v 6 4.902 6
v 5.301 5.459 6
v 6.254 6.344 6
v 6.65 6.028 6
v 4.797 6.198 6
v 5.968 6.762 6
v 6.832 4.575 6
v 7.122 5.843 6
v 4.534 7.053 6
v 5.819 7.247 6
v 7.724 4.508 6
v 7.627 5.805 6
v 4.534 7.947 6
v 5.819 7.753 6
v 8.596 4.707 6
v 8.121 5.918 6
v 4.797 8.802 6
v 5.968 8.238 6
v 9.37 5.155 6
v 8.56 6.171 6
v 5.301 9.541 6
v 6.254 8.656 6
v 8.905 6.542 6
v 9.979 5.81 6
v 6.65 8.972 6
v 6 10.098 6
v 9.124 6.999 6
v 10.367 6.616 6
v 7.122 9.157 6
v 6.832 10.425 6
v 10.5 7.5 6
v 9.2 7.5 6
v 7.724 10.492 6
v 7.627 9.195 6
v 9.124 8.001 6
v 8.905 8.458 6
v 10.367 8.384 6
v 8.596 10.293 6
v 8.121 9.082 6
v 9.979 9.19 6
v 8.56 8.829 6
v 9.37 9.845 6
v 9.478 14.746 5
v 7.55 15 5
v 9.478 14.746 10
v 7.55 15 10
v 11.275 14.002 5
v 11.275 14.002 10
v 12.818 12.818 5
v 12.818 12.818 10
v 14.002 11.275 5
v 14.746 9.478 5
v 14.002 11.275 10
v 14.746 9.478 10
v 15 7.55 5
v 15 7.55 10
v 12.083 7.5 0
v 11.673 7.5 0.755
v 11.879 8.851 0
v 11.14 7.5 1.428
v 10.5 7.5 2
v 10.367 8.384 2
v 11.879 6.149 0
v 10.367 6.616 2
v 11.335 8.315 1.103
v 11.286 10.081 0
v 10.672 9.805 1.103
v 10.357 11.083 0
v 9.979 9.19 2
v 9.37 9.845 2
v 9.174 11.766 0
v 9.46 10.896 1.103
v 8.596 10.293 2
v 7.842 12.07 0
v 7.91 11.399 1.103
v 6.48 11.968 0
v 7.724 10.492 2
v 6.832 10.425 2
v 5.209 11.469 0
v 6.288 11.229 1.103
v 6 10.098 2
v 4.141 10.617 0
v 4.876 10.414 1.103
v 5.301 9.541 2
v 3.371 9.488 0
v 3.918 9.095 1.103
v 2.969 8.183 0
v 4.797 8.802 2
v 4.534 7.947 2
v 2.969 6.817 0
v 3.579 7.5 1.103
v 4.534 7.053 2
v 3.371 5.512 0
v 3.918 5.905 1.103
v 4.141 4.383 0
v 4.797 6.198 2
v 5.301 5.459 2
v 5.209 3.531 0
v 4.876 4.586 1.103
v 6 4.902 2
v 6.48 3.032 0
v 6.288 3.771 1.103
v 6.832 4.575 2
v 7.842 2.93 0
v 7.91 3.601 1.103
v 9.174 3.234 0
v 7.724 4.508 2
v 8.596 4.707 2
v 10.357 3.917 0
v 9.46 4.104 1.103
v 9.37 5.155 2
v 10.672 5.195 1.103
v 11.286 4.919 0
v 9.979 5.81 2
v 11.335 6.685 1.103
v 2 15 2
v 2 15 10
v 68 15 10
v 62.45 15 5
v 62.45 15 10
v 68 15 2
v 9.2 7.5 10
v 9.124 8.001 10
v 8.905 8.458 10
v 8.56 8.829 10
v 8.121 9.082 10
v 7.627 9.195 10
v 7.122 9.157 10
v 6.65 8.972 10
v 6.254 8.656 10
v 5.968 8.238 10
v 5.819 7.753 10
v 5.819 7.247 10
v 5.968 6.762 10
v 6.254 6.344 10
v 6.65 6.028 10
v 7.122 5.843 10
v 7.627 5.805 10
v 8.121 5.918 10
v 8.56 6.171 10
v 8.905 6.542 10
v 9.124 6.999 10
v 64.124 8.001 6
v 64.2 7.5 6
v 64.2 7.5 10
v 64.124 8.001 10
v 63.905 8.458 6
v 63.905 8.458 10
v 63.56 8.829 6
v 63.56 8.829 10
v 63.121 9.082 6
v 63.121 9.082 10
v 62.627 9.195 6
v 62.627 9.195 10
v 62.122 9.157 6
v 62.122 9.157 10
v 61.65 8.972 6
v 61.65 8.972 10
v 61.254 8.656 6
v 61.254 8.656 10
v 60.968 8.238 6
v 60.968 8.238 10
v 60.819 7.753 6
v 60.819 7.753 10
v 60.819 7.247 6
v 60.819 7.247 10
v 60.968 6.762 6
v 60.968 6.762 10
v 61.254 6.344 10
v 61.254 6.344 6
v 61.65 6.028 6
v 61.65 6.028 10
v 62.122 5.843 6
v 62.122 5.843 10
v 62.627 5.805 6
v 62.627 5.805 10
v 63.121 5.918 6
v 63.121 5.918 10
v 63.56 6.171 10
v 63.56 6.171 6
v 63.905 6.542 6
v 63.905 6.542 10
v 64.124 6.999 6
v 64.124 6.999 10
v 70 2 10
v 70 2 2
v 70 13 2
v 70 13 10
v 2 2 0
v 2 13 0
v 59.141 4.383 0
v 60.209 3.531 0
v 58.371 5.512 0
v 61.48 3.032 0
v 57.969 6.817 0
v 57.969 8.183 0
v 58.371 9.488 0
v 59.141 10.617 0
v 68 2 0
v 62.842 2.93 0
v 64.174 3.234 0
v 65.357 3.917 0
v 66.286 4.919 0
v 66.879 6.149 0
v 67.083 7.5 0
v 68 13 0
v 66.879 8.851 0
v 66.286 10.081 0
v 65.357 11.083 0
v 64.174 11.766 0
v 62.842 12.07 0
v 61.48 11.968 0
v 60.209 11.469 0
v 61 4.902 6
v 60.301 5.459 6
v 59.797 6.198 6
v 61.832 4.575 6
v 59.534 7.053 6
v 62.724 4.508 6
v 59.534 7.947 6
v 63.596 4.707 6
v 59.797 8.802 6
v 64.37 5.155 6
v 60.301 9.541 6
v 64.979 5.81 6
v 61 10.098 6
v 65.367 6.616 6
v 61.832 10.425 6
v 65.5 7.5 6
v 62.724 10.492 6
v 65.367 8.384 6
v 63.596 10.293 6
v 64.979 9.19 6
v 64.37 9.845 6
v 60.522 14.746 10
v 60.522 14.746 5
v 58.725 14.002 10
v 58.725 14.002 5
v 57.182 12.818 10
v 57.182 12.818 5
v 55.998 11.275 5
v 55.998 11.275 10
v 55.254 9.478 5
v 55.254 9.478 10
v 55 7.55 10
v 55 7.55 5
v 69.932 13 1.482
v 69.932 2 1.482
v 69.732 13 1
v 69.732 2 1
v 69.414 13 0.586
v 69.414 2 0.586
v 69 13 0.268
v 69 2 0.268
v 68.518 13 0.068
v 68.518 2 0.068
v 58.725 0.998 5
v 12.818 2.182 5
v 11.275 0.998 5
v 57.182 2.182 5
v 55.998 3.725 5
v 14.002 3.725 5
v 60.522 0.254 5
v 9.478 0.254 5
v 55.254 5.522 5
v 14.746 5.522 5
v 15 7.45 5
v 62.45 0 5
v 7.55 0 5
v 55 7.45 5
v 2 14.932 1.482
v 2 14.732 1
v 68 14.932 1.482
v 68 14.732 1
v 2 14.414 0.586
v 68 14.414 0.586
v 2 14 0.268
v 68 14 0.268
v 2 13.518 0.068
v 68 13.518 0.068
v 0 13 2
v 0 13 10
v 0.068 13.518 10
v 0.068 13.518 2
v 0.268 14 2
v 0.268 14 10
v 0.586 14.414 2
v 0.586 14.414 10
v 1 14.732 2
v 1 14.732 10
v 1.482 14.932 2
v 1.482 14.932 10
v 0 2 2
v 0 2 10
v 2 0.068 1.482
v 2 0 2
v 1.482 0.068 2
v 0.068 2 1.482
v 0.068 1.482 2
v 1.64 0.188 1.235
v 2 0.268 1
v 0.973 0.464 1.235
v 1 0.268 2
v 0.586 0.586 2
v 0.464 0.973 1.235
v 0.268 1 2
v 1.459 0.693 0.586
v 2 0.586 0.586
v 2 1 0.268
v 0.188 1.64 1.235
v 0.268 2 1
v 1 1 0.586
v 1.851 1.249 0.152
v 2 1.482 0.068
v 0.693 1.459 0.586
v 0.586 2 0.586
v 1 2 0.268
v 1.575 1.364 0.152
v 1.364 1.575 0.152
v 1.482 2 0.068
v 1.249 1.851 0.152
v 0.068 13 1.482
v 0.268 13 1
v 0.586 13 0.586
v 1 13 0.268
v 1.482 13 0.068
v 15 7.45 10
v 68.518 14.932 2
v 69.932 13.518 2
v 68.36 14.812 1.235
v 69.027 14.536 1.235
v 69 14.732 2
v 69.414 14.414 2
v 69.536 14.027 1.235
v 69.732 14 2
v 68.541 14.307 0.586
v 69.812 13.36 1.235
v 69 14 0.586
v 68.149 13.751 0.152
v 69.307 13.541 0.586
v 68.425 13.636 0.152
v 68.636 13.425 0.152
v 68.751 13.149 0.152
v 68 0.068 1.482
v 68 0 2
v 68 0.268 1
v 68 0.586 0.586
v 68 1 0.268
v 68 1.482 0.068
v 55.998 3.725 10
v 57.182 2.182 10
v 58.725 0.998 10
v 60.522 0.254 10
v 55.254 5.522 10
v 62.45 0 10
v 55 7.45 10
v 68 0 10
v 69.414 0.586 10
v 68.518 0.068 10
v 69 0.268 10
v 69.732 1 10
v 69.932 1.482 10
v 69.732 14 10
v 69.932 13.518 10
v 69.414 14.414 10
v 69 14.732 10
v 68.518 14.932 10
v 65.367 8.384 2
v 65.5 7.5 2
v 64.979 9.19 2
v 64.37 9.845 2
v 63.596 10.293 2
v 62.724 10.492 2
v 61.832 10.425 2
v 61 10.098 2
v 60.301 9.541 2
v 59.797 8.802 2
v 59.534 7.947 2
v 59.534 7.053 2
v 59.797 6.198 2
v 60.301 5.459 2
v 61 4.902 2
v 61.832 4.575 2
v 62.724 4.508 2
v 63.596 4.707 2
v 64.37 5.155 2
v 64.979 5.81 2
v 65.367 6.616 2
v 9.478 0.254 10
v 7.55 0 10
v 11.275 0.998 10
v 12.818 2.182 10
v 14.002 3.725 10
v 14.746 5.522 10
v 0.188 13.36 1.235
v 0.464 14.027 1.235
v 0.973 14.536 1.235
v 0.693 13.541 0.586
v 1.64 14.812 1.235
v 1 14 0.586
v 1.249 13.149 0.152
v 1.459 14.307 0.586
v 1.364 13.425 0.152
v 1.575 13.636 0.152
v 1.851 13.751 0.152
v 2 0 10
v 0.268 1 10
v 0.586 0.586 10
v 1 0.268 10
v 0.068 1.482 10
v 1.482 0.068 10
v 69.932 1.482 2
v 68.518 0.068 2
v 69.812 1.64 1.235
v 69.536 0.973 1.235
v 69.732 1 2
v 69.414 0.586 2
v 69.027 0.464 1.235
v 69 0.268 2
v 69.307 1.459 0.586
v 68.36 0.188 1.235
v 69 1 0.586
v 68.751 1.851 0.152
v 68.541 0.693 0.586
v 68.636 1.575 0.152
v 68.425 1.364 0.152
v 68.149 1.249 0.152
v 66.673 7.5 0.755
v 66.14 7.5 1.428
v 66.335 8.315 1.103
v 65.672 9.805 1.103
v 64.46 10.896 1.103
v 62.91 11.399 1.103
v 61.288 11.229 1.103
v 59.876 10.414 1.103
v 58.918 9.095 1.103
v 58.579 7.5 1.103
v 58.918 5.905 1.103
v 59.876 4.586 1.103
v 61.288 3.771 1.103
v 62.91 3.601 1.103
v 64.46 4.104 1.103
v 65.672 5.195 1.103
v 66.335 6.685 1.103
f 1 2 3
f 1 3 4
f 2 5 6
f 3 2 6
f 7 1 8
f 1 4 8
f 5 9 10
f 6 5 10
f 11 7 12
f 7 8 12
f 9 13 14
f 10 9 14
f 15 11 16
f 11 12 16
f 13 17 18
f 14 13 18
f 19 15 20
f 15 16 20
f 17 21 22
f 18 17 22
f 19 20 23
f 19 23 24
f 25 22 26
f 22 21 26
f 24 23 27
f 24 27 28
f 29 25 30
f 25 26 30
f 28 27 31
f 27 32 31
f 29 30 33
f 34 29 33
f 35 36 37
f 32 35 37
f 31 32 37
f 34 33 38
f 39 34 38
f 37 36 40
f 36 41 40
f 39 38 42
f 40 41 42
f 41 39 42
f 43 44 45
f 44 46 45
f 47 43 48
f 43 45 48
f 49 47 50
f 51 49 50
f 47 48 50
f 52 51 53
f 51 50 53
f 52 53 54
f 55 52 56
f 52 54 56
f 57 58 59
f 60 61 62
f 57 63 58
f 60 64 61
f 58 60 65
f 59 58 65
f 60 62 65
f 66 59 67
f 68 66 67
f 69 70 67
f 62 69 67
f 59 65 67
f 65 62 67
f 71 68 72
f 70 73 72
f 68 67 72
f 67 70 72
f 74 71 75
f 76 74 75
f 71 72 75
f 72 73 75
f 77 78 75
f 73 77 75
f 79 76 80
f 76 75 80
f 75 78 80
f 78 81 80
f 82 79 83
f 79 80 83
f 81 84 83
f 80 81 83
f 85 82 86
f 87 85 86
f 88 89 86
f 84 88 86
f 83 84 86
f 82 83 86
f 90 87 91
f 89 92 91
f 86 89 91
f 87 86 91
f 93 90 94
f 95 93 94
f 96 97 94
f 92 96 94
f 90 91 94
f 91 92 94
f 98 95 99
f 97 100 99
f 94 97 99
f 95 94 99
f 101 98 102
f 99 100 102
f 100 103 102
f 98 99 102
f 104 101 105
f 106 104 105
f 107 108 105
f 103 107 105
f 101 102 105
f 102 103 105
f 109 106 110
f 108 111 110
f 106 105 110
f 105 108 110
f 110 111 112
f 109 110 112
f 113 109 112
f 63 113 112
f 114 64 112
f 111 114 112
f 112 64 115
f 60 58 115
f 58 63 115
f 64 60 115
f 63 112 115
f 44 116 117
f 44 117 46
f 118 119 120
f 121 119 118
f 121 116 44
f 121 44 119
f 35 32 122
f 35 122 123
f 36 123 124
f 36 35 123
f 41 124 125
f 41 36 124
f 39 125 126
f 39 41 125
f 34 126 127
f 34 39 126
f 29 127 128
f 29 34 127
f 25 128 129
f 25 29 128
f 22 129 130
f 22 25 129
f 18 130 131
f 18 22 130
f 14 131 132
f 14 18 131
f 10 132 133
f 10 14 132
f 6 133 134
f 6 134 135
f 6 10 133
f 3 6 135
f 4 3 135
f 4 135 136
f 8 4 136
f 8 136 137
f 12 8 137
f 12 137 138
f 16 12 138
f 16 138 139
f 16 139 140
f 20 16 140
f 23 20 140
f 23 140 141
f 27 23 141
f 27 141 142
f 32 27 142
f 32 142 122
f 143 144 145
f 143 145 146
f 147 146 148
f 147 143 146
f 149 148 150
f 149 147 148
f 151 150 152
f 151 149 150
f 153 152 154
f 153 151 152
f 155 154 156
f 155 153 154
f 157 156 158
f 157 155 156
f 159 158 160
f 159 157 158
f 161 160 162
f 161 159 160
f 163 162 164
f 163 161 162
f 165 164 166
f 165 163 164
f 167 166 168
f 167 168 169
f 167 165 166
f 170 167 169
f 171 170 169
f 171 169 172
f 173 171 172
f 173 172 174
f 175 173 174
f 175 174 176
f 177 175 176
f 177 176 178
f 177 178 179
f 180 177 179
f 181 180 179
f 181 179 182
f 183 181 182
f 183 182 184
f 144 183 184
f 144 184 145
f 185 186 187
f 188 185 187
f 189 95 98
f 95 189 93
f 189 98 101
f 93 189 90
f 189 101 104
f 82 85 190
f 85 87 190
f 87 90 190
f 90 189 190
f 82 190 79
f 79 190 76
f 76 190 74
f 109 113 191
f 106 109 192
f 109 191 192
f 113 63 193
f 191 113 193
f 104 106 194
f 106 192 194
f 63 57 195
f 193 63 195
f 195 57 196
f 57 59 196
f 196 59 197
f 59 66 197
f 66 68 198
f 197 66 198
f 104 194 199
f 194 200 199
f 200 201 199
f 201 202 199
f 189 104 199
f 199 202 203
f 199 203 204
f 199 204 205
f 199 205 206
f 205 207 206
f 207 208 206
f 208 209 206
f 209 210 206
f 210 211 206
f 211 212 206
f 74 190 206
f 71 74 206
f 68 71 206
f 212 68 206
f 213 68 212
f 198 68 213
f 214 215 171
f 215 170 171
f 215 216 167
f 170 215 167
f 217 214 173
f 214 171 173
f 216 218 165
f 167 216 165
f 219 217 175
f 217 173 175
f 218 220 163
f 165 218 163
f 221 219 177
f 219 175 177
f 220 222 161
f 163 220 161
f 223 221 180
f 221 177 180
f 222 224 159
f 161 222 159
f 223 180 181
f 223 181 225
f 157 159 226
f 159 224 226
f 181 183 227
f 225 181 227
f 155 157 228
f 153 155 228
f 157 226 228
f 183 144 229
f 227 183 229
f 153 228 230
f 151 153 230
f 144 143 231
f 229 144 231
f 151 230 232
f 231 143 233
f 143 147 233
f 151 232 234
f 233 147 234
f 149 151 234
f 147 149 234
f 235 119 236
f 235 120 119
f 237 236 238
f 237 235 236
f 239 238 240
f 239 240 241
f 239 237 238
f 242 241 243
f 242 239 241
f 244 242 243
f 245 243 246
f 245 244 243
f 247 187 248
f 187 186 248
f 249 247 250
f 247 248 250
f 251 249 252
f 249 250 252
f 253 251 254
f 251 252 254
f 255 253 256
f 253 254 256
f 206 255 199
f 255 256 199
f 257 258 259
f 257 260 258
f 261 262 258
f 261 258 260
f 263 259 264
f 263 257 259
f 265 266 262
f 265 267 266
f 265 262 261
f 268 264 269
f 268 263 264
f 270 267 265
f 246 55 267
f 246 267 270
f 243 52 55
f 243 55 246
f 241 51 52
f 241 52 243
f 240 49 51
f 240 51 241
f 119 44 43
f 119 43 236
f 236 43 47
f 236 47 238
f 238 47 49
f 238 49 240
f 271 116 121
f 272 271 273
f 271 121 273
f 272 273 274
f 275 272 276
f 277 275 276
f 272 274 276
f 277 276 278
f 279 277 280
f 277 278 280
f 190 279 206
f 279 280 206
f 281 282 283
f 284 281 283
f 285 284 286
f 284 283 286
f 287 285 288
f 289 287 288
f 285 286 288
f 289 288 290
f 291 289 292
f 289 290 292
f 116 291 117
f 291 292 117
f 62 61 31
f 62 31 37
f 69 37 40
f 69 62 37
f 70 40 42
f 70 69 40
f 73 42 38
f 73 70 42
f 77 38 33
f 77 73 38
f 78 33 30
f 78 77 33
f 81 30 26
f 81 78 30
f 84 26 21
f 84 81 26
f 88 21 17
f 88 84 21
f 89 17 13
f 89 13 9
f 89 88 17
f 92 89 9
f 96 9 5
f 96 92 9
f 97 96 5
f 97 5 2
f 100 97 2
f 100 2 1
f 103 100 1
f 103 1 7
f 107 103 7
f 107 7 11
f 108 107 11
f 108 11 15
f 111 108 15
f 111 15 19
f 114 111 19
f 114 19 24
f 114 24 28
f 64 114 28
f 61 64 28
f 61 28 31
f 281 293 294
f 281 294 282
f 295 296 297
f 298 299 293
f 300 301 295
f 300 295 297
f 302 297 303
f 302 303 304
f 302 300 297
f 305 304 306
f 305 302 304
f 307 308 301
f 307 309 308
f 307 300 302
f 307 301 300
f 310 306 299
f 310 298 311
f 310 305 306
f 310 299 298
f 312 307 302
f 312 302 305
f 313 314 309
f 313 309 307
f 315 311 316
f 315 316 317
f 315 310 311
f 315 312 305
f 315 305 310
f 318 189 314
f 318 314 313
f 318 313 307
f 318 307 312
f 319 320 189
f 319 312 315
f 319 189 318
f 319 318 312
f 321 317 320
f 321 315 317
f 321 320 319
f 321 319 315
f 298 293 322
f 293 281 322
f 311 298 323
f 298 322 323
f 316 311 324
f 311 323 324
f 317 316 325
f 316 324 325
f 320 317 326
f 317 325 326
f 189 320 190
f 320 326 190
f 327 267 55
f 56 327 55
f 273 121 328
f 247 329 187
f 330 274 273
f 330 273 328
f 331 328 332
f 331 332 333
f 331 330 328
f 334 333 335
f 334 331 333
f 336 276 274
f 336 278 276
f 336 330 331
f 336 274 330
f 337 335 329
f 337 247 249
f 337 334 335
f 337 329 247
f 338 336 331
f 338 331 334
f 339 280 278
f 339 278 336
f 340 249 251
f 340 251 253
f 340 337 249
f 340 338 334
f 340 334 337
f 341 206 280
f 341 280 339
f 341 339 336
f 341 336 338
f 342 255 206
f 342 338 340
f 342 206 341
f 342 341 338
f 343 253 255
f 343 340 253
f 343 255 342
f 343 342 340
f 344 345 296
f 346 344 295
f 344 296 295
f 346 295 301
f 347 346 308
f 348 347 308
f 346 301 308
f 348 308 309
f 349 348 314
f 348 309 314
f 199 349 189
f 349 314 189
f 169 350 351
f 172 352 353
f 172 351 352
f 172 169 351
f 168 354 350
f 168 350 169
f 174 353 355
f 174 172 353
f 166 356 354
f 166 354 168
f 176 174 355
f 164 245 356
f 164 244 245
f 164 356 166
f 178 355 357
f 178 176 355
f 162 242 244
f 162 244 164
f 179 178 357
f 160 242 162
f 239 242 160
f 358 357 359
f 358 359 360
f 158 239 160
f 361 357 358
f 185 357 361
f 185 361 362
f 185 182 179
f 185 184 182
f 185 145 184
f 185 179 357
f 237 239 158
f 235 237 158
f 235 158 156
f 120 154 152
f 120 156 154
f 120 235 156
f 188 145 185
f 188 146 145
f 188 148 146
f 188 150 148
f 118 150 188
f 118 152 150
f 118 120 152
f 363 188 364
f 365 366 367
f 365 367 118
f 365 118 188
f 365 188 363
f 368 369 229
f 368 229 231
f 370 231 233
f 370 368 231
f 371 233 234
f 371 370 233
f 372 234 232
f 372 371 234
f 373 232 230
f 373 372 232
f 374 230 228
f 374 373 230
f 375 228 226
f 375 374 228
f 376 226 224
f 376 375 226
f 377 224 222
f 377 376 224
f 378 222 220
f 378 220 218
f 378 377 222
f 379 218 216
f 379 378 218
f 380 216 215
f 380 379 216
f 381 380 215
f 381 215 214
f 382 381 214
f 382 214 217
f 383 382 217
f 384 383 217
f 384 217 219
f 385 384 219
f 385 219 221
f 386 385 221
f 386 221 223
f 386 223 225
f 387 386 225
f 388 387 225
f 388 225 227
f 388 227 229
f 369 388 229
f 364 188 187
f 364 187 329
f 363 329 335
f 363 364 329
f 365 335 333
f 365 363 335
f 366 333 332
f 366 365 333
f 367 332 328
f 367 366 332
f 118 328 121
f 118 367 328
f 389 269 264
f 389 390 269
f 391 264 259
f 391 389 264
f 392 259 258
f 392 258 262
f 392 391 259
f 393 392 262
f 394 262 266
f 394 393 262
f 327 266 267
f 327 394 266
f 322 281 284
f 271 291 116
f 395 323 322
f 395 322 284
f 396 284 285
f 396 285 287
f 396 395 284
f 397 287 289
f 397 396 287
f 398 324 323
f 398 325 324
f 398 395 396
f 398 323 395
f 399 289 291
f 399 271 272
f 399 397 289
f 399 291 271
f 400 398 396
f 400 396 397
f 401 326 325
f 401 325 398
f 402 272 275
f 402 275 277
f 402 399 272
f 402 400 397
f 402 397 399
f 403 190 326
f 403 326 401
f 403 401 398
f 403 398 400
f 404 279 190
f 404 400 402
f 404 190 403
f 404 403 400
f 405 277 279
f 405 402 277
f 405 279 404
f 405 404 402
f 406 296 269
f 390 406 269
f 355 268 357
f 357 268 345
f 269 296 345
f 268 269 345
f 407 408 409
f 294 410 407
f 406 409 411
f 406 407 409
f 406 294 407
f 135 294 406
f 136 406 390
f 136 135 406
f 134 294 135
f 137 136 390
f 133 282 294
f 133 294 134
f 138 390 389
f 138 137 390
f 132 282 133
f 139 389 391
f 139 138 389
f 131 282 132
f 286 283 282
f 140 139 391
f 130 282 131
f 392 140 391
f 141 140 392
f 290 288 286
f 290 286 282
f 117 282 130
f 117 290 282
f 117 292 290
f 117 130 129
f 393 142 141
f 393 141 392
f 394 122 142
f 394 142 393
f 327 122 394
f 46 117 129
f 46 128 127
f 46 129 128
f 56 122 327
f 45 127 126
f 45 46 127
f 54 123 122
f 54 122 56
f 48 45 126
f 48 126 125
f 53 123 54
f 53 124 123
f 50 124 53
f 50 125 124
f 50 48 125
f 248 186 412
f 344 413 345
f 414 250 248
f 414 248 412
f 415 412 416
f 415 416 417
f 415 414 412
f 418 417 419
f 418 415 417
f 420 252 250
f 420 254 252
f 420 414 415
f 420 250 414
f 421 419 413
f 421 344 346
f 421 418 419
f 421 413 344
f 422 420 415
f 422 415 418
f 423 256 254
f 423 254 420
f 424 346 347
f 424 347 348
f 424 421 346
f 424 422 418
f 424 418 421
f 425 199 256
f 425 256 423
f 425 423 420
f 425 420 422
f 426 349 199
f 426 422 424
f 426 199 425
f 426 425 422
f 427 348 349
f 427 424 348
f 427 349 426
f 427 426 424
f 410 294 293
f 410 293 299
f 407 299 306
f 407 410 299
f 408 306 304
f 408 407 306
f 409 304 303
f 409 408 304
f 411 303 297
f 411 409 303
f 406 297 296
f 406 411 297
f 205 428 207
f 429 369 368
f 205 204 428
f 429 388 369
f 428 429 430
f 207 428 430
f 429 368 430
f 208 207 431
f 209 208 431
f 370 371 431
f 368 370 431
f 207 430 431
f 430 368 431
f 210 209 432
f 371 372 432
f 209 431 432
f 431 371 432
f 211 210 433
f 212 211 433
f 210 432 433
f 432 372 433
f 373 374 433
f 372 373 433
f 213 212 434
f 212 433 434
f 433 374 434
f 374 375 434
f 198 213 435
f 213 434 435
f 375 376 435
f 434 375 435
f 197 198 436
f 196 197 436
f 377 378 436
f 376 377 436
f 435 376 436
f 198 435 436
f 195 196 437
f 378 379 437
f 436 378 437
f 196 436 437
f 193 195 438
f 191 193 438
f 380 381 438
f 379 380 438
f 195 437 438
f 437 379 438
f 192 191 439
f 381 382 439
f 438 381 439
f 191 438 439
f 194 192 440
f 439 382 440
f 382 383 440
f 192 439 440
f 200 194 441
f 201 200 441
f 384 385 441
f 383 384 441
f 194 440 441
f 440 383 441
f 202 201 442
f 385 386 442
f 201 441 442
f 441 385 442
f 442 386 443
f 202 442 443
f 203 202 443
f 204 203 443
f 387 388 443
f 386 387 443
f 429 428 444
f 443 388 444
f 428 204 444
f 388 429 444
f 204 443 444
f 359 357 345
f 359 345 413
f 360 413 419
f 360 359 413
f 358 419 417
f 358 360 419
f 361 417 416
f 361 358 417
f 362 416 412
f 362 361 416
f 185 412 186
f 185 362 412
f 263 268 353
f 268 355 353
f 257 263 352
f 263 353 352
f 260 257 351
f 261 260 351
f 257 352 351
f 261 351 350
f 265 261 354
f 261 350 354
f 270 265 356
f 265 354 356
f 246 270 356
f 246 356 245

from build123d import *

# Parameters (mm, degrees)
BOX001_W          = 40
BOX001_H          = 15
BOX001_DEPTH      = 5
CYLINDER003_R     = 3
CYLINDER003_DEPTH = 6
CYLINDER002_R     = 3
CYLINDER002_DEPTH = 6
CYLINDER001_R     = 1.7
CYLINDER001_DEPTH = 10
CYLINDER_R        = 1.7
CYLINDER_DEPTH    = 10
BOX_W             = 70
BOX_H             = 15
BOX_DEPTH         = 10
FILLET_R          = 2
FILLET001_R       = 2
FILLET002_R       = 7.45


with BuildPart() as cube001:
    # Box001 → Box001 (new body)
    with BuildSketch(Plane(origin=(15, 0, 5), x_dir=(1, 0, 0), z_dir=(0, 0, 1))):
        with Locations((20, 7.5)):
            Rectangle(BOX001_W, BOX001_H)
    extrude(amount=BOX001_DEPTH)


with BuildPart() as sphere001:
    # Sphere001 → Sphere001 (revolve)
    with BuildSketch(Plane(origin=(62.5, 7.5, -2), x_dir=(1, 0, 0), z_dir=(0, -1, 0))):
        with BuildLine():
            ThreePointArc((0, -5), (5, 0), (0, 5))
            Line((0, 5), (0, -5))
        make_face()
    revolve(axis=Axis((62.5, 7.5, -2), (0, 0, 1)))


with BuildPart() as sphere:
    # Sphere → Sphere (revolve)
    with BuildSketch(Plane(origin=(7.5, 7.5, -2), x_dir=(1, 0, 0), z_dir=(0, -1, 0))):
        with BuildLine():
            ThreePointArc((0, -5), (5, 0), (0, 5))
            Line((0, 5), (0, -5))
        make_face()
    revolve(axis=Axis((7.5, 7.5, -2), (0, 0, 1)))


with BuildPart() as cylinder003:
    # Cylinder003 → Cylinder003 (new body)
    with BuildSketch(Plane(origin=(62.5, 7.5, 0), x_dir=(1, 0, 0), z_dir=(0, 0, 1))):
        Circle(CYLINDER003_R)
    extrude(amount=CYLINDER003_DEPTH)


with BuildPart() as cylinder002:
    # Cylinder002 → Cylinder002 (new body)
    with BuildSketch(Plane(origin=(7.5, 7.5, 0), x_dir=(1, 0, 0), z_dir=(0, 0, 1))):
        Circle(CYLINDER002_R)
    extrude(amount=CYLINDER002_DEPTH)


with BuildPart() as cylinder001:
    # Cylinder001 → Cylinder001 (new body)
    with BuildSketch(Plane(origin=(62.5, 7.5, 0), x_dir=(1, 0, 0), z_dir=(0, 0, 1))):
        Circle(CYLINDER001_R)
    extrude(amount=CYLINDER001_DEPTH)


with BuildPart() as cylinder:
    # Cylinder → Cylinder (new body)
    with BuildSketch(Plane(origin=(7.5, 7.5, 0), x_dir=(1, 0, 0), z_dir=(0, 0, 1))):
        Circle(CYLINDER_R)
    extrude(amount=CYLINDER_DEPTH)


with BuildPart() as print2_misumi_top_mount:
    # Box → Box (new body)
    with BuildSketch(Plane.XY):
        with Locations((35, 7.5)):
            Rectangle(BOX_W, BOX_H)
    extrude(amount=BOX_DEPTH)

    # Fillet
    fillet_edges = [print2_misumi_top_mount.edges().sort_by_distance(p)[0] for p in [
        (0, 0, 5),
        (0, 15, 5),
        (70, 0, 5),
        (70, 15, 5),
    ]]
    fillet(fillet_edges, radius=FILLET_R)

    # Fillet001
    fillet001_edges = [print2_misumi_top_mount.edges().sort_by_distance(p)[0] for p in [
        (0, 7.5, 0),
        (0.585786, 0.585786, 0),
        (0.585786, 14.414214, 0),
        (35, 0, 0),
        (35, 15, 0),
        (69.414214, 0.585786, 0),
        (69.414214, 14.414214, 0),
        (70, 7.5, 0),
    ]]
    fillet(fillet001_edges, radius=FILLET001_R)

    # Cut: cut Cylinder
    add(cylinder.part, mode=Mode.SUBTRACT)

    # Cut001: cut Cylinder001
    add(cylinder001.part, mode=Mode.SUBTRACT)

    # Cut002: cut Cylinder002
    add(cylinder002.part, mode=Mode.SUBTRACT)

    # Cut003: cut Cylinder003
    add(cylinder003.part, mode=Mode.SUBTRACT)

    # Cut004: cut Sphere
    add(sphere.part, mode=Mode.SUBTRACT)

    # Cut005: cut Sphere001
    add(sphere001.part, mode=Mode.SUBTRACT)

    # Cut006: cut Cube001
    add(cube001.part, mode=Mode.SUBTRACT)

    # Fillet002
    fillet002_edges = [print2_misumi_top_mount.edges().sort_by_distance(p)[0] for p in [
        (55, 0, 7.5),
        (15, 0, 7.5),
        (55, 15, 7.5),
        (15, 15, 7.5),
    ]]
    fillet(fillet002_edges, radius=FILLET002_R)


solid = print2_misumi_top_mount.part
